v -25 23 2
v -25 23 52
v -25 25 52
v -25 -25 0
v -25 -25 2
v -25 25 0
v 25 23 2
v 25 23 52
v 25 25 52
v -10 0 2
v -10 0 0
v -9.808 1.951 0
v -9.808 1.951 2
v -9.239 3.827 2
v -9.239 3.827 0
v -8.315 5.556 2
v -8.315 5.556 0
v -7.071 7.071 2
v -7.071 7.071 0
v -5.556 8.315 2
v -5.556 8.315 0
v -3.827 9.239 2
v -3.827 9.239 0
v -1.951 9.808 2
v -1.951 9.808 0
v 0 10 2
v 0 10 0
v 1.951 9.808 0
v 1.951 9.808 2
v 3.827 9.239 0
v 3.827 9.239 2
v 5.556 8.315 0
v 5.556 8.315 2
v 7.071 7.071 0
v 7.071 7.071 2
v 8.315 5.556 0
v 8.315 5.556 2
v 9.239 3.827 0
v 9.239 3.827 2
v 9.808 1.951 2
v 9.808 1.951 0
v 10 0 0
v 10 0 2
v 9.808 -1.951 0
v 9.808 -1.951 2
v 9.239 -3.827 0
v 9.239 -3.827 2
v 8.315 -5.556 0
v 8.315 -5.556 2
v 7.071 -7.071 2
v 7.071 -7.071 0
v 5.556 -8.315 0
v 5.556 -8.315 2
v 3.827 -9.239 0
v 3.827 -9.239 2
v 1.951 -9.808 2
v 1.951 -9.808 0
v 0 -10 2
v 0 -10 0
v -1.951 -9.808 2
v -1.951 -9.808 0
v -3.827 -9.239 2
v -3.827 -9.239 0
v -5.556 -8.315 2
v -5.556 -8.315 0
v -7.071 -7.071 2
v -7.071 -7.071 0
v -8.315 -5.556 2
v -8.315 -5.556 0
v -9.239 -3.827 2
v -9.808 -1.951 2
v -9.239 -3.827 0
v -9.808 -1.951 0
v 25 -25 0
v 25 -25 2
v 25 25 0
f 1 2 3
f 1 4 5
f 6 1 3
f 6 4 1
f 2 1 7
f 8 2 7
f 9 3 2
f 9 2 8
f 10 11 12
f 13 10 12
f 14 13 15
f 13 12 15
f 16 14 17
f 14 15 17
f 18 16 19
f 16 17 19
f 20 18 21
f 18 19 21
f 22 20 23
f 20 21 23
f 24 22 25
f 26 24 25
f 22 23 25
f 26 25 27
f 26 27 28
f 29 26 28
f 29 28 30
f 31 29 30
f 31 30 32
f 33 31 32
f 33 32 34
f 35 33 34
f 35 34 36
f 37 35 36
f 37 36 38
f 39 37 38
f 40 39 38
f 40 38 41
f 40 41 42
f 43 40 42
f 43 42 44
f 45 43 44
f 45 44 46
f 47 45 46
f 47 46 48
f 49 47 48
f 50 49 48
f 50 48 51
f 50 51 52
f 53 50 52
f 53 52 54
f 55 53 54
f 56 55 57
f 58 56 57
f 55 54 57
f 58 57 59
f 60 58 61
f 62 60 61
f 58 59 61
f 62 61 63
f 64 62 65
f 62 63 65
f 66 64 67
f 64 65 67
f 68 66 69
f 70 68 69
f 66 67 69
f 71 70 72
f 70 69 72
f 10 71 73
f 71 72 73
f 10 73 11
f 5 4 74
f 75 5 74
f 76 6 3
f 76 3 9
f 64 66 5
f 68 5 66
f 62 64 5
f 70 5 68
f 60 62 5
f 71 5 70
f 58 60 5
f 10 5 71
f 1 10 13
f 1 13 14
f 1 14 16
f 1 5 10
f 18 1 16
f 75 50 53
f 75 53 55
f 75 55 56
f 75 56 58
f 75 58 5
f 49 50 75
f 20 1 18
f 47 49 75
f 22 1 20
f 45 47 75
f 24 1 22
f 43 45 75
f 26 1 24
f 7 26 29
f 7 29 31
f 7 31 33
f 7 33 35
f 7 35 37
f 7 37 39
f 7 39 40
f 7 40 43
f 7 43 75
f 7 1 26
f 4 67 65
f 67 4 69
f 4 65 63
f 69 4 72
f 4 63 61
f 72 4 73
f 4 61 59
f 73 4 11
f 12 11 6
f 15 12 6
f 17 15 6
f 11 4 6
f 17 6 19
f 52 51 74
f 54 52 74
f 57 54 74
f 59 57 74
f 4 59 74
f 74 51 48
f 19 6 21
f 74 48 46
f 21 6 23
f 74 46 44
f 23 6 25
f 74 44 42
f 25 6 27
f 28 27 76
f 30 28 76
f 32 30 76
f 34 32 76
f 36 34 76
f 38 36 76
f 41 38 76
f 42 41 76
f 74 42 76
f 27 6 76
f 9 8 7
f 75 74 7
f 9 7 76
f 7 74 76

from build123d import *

# Parameters (mm, degrees)
SKETCH1_W           = 50
SKETCH1_H           = 50
BOSS_EXTRUDE1_DEPTH = 2
SKETCH2_W           = 50
SKETCH2_H           = 2
BOSS_EXTRUDE2_DEPTH = 50
SKETCH3_R           = 10
CUT_EXTRUDE2_DEPTH  = 20


with BuildPart() as part:
    # Sketch1 → Boss-Extrude1 (new body)
    with BuildSketch(Plane.XY):
        Rectangle(SKETCH1_W, SKETCH1_H)
    extrude(amount=BOSS_EXTRUDE1_DEPTH)

    # Sketch2 → Boss-Extrude2 (add)
    with BuildSketch(Plane.XY.offset(2)):
        with Locations((0, 24)):
            Rectangle(SKETCH2_W, SKETCH2_H)
    extrude(amount=BOSS_EXTRUDE2_DEPTH)

    # Sketch3 → Cut-Extrude2 (cut)
    with BuildSketch(Plane(origin=(0, 0, 0), x_dir=(-1, 0, 0), z_dir=(0, 0, -1))):
        Circle(SKETCH3_R)
    extrude(amount=-CUT_EXTRUDE2_DEPTH, mode=Mode.SUBTRACT)


solid = part.part
